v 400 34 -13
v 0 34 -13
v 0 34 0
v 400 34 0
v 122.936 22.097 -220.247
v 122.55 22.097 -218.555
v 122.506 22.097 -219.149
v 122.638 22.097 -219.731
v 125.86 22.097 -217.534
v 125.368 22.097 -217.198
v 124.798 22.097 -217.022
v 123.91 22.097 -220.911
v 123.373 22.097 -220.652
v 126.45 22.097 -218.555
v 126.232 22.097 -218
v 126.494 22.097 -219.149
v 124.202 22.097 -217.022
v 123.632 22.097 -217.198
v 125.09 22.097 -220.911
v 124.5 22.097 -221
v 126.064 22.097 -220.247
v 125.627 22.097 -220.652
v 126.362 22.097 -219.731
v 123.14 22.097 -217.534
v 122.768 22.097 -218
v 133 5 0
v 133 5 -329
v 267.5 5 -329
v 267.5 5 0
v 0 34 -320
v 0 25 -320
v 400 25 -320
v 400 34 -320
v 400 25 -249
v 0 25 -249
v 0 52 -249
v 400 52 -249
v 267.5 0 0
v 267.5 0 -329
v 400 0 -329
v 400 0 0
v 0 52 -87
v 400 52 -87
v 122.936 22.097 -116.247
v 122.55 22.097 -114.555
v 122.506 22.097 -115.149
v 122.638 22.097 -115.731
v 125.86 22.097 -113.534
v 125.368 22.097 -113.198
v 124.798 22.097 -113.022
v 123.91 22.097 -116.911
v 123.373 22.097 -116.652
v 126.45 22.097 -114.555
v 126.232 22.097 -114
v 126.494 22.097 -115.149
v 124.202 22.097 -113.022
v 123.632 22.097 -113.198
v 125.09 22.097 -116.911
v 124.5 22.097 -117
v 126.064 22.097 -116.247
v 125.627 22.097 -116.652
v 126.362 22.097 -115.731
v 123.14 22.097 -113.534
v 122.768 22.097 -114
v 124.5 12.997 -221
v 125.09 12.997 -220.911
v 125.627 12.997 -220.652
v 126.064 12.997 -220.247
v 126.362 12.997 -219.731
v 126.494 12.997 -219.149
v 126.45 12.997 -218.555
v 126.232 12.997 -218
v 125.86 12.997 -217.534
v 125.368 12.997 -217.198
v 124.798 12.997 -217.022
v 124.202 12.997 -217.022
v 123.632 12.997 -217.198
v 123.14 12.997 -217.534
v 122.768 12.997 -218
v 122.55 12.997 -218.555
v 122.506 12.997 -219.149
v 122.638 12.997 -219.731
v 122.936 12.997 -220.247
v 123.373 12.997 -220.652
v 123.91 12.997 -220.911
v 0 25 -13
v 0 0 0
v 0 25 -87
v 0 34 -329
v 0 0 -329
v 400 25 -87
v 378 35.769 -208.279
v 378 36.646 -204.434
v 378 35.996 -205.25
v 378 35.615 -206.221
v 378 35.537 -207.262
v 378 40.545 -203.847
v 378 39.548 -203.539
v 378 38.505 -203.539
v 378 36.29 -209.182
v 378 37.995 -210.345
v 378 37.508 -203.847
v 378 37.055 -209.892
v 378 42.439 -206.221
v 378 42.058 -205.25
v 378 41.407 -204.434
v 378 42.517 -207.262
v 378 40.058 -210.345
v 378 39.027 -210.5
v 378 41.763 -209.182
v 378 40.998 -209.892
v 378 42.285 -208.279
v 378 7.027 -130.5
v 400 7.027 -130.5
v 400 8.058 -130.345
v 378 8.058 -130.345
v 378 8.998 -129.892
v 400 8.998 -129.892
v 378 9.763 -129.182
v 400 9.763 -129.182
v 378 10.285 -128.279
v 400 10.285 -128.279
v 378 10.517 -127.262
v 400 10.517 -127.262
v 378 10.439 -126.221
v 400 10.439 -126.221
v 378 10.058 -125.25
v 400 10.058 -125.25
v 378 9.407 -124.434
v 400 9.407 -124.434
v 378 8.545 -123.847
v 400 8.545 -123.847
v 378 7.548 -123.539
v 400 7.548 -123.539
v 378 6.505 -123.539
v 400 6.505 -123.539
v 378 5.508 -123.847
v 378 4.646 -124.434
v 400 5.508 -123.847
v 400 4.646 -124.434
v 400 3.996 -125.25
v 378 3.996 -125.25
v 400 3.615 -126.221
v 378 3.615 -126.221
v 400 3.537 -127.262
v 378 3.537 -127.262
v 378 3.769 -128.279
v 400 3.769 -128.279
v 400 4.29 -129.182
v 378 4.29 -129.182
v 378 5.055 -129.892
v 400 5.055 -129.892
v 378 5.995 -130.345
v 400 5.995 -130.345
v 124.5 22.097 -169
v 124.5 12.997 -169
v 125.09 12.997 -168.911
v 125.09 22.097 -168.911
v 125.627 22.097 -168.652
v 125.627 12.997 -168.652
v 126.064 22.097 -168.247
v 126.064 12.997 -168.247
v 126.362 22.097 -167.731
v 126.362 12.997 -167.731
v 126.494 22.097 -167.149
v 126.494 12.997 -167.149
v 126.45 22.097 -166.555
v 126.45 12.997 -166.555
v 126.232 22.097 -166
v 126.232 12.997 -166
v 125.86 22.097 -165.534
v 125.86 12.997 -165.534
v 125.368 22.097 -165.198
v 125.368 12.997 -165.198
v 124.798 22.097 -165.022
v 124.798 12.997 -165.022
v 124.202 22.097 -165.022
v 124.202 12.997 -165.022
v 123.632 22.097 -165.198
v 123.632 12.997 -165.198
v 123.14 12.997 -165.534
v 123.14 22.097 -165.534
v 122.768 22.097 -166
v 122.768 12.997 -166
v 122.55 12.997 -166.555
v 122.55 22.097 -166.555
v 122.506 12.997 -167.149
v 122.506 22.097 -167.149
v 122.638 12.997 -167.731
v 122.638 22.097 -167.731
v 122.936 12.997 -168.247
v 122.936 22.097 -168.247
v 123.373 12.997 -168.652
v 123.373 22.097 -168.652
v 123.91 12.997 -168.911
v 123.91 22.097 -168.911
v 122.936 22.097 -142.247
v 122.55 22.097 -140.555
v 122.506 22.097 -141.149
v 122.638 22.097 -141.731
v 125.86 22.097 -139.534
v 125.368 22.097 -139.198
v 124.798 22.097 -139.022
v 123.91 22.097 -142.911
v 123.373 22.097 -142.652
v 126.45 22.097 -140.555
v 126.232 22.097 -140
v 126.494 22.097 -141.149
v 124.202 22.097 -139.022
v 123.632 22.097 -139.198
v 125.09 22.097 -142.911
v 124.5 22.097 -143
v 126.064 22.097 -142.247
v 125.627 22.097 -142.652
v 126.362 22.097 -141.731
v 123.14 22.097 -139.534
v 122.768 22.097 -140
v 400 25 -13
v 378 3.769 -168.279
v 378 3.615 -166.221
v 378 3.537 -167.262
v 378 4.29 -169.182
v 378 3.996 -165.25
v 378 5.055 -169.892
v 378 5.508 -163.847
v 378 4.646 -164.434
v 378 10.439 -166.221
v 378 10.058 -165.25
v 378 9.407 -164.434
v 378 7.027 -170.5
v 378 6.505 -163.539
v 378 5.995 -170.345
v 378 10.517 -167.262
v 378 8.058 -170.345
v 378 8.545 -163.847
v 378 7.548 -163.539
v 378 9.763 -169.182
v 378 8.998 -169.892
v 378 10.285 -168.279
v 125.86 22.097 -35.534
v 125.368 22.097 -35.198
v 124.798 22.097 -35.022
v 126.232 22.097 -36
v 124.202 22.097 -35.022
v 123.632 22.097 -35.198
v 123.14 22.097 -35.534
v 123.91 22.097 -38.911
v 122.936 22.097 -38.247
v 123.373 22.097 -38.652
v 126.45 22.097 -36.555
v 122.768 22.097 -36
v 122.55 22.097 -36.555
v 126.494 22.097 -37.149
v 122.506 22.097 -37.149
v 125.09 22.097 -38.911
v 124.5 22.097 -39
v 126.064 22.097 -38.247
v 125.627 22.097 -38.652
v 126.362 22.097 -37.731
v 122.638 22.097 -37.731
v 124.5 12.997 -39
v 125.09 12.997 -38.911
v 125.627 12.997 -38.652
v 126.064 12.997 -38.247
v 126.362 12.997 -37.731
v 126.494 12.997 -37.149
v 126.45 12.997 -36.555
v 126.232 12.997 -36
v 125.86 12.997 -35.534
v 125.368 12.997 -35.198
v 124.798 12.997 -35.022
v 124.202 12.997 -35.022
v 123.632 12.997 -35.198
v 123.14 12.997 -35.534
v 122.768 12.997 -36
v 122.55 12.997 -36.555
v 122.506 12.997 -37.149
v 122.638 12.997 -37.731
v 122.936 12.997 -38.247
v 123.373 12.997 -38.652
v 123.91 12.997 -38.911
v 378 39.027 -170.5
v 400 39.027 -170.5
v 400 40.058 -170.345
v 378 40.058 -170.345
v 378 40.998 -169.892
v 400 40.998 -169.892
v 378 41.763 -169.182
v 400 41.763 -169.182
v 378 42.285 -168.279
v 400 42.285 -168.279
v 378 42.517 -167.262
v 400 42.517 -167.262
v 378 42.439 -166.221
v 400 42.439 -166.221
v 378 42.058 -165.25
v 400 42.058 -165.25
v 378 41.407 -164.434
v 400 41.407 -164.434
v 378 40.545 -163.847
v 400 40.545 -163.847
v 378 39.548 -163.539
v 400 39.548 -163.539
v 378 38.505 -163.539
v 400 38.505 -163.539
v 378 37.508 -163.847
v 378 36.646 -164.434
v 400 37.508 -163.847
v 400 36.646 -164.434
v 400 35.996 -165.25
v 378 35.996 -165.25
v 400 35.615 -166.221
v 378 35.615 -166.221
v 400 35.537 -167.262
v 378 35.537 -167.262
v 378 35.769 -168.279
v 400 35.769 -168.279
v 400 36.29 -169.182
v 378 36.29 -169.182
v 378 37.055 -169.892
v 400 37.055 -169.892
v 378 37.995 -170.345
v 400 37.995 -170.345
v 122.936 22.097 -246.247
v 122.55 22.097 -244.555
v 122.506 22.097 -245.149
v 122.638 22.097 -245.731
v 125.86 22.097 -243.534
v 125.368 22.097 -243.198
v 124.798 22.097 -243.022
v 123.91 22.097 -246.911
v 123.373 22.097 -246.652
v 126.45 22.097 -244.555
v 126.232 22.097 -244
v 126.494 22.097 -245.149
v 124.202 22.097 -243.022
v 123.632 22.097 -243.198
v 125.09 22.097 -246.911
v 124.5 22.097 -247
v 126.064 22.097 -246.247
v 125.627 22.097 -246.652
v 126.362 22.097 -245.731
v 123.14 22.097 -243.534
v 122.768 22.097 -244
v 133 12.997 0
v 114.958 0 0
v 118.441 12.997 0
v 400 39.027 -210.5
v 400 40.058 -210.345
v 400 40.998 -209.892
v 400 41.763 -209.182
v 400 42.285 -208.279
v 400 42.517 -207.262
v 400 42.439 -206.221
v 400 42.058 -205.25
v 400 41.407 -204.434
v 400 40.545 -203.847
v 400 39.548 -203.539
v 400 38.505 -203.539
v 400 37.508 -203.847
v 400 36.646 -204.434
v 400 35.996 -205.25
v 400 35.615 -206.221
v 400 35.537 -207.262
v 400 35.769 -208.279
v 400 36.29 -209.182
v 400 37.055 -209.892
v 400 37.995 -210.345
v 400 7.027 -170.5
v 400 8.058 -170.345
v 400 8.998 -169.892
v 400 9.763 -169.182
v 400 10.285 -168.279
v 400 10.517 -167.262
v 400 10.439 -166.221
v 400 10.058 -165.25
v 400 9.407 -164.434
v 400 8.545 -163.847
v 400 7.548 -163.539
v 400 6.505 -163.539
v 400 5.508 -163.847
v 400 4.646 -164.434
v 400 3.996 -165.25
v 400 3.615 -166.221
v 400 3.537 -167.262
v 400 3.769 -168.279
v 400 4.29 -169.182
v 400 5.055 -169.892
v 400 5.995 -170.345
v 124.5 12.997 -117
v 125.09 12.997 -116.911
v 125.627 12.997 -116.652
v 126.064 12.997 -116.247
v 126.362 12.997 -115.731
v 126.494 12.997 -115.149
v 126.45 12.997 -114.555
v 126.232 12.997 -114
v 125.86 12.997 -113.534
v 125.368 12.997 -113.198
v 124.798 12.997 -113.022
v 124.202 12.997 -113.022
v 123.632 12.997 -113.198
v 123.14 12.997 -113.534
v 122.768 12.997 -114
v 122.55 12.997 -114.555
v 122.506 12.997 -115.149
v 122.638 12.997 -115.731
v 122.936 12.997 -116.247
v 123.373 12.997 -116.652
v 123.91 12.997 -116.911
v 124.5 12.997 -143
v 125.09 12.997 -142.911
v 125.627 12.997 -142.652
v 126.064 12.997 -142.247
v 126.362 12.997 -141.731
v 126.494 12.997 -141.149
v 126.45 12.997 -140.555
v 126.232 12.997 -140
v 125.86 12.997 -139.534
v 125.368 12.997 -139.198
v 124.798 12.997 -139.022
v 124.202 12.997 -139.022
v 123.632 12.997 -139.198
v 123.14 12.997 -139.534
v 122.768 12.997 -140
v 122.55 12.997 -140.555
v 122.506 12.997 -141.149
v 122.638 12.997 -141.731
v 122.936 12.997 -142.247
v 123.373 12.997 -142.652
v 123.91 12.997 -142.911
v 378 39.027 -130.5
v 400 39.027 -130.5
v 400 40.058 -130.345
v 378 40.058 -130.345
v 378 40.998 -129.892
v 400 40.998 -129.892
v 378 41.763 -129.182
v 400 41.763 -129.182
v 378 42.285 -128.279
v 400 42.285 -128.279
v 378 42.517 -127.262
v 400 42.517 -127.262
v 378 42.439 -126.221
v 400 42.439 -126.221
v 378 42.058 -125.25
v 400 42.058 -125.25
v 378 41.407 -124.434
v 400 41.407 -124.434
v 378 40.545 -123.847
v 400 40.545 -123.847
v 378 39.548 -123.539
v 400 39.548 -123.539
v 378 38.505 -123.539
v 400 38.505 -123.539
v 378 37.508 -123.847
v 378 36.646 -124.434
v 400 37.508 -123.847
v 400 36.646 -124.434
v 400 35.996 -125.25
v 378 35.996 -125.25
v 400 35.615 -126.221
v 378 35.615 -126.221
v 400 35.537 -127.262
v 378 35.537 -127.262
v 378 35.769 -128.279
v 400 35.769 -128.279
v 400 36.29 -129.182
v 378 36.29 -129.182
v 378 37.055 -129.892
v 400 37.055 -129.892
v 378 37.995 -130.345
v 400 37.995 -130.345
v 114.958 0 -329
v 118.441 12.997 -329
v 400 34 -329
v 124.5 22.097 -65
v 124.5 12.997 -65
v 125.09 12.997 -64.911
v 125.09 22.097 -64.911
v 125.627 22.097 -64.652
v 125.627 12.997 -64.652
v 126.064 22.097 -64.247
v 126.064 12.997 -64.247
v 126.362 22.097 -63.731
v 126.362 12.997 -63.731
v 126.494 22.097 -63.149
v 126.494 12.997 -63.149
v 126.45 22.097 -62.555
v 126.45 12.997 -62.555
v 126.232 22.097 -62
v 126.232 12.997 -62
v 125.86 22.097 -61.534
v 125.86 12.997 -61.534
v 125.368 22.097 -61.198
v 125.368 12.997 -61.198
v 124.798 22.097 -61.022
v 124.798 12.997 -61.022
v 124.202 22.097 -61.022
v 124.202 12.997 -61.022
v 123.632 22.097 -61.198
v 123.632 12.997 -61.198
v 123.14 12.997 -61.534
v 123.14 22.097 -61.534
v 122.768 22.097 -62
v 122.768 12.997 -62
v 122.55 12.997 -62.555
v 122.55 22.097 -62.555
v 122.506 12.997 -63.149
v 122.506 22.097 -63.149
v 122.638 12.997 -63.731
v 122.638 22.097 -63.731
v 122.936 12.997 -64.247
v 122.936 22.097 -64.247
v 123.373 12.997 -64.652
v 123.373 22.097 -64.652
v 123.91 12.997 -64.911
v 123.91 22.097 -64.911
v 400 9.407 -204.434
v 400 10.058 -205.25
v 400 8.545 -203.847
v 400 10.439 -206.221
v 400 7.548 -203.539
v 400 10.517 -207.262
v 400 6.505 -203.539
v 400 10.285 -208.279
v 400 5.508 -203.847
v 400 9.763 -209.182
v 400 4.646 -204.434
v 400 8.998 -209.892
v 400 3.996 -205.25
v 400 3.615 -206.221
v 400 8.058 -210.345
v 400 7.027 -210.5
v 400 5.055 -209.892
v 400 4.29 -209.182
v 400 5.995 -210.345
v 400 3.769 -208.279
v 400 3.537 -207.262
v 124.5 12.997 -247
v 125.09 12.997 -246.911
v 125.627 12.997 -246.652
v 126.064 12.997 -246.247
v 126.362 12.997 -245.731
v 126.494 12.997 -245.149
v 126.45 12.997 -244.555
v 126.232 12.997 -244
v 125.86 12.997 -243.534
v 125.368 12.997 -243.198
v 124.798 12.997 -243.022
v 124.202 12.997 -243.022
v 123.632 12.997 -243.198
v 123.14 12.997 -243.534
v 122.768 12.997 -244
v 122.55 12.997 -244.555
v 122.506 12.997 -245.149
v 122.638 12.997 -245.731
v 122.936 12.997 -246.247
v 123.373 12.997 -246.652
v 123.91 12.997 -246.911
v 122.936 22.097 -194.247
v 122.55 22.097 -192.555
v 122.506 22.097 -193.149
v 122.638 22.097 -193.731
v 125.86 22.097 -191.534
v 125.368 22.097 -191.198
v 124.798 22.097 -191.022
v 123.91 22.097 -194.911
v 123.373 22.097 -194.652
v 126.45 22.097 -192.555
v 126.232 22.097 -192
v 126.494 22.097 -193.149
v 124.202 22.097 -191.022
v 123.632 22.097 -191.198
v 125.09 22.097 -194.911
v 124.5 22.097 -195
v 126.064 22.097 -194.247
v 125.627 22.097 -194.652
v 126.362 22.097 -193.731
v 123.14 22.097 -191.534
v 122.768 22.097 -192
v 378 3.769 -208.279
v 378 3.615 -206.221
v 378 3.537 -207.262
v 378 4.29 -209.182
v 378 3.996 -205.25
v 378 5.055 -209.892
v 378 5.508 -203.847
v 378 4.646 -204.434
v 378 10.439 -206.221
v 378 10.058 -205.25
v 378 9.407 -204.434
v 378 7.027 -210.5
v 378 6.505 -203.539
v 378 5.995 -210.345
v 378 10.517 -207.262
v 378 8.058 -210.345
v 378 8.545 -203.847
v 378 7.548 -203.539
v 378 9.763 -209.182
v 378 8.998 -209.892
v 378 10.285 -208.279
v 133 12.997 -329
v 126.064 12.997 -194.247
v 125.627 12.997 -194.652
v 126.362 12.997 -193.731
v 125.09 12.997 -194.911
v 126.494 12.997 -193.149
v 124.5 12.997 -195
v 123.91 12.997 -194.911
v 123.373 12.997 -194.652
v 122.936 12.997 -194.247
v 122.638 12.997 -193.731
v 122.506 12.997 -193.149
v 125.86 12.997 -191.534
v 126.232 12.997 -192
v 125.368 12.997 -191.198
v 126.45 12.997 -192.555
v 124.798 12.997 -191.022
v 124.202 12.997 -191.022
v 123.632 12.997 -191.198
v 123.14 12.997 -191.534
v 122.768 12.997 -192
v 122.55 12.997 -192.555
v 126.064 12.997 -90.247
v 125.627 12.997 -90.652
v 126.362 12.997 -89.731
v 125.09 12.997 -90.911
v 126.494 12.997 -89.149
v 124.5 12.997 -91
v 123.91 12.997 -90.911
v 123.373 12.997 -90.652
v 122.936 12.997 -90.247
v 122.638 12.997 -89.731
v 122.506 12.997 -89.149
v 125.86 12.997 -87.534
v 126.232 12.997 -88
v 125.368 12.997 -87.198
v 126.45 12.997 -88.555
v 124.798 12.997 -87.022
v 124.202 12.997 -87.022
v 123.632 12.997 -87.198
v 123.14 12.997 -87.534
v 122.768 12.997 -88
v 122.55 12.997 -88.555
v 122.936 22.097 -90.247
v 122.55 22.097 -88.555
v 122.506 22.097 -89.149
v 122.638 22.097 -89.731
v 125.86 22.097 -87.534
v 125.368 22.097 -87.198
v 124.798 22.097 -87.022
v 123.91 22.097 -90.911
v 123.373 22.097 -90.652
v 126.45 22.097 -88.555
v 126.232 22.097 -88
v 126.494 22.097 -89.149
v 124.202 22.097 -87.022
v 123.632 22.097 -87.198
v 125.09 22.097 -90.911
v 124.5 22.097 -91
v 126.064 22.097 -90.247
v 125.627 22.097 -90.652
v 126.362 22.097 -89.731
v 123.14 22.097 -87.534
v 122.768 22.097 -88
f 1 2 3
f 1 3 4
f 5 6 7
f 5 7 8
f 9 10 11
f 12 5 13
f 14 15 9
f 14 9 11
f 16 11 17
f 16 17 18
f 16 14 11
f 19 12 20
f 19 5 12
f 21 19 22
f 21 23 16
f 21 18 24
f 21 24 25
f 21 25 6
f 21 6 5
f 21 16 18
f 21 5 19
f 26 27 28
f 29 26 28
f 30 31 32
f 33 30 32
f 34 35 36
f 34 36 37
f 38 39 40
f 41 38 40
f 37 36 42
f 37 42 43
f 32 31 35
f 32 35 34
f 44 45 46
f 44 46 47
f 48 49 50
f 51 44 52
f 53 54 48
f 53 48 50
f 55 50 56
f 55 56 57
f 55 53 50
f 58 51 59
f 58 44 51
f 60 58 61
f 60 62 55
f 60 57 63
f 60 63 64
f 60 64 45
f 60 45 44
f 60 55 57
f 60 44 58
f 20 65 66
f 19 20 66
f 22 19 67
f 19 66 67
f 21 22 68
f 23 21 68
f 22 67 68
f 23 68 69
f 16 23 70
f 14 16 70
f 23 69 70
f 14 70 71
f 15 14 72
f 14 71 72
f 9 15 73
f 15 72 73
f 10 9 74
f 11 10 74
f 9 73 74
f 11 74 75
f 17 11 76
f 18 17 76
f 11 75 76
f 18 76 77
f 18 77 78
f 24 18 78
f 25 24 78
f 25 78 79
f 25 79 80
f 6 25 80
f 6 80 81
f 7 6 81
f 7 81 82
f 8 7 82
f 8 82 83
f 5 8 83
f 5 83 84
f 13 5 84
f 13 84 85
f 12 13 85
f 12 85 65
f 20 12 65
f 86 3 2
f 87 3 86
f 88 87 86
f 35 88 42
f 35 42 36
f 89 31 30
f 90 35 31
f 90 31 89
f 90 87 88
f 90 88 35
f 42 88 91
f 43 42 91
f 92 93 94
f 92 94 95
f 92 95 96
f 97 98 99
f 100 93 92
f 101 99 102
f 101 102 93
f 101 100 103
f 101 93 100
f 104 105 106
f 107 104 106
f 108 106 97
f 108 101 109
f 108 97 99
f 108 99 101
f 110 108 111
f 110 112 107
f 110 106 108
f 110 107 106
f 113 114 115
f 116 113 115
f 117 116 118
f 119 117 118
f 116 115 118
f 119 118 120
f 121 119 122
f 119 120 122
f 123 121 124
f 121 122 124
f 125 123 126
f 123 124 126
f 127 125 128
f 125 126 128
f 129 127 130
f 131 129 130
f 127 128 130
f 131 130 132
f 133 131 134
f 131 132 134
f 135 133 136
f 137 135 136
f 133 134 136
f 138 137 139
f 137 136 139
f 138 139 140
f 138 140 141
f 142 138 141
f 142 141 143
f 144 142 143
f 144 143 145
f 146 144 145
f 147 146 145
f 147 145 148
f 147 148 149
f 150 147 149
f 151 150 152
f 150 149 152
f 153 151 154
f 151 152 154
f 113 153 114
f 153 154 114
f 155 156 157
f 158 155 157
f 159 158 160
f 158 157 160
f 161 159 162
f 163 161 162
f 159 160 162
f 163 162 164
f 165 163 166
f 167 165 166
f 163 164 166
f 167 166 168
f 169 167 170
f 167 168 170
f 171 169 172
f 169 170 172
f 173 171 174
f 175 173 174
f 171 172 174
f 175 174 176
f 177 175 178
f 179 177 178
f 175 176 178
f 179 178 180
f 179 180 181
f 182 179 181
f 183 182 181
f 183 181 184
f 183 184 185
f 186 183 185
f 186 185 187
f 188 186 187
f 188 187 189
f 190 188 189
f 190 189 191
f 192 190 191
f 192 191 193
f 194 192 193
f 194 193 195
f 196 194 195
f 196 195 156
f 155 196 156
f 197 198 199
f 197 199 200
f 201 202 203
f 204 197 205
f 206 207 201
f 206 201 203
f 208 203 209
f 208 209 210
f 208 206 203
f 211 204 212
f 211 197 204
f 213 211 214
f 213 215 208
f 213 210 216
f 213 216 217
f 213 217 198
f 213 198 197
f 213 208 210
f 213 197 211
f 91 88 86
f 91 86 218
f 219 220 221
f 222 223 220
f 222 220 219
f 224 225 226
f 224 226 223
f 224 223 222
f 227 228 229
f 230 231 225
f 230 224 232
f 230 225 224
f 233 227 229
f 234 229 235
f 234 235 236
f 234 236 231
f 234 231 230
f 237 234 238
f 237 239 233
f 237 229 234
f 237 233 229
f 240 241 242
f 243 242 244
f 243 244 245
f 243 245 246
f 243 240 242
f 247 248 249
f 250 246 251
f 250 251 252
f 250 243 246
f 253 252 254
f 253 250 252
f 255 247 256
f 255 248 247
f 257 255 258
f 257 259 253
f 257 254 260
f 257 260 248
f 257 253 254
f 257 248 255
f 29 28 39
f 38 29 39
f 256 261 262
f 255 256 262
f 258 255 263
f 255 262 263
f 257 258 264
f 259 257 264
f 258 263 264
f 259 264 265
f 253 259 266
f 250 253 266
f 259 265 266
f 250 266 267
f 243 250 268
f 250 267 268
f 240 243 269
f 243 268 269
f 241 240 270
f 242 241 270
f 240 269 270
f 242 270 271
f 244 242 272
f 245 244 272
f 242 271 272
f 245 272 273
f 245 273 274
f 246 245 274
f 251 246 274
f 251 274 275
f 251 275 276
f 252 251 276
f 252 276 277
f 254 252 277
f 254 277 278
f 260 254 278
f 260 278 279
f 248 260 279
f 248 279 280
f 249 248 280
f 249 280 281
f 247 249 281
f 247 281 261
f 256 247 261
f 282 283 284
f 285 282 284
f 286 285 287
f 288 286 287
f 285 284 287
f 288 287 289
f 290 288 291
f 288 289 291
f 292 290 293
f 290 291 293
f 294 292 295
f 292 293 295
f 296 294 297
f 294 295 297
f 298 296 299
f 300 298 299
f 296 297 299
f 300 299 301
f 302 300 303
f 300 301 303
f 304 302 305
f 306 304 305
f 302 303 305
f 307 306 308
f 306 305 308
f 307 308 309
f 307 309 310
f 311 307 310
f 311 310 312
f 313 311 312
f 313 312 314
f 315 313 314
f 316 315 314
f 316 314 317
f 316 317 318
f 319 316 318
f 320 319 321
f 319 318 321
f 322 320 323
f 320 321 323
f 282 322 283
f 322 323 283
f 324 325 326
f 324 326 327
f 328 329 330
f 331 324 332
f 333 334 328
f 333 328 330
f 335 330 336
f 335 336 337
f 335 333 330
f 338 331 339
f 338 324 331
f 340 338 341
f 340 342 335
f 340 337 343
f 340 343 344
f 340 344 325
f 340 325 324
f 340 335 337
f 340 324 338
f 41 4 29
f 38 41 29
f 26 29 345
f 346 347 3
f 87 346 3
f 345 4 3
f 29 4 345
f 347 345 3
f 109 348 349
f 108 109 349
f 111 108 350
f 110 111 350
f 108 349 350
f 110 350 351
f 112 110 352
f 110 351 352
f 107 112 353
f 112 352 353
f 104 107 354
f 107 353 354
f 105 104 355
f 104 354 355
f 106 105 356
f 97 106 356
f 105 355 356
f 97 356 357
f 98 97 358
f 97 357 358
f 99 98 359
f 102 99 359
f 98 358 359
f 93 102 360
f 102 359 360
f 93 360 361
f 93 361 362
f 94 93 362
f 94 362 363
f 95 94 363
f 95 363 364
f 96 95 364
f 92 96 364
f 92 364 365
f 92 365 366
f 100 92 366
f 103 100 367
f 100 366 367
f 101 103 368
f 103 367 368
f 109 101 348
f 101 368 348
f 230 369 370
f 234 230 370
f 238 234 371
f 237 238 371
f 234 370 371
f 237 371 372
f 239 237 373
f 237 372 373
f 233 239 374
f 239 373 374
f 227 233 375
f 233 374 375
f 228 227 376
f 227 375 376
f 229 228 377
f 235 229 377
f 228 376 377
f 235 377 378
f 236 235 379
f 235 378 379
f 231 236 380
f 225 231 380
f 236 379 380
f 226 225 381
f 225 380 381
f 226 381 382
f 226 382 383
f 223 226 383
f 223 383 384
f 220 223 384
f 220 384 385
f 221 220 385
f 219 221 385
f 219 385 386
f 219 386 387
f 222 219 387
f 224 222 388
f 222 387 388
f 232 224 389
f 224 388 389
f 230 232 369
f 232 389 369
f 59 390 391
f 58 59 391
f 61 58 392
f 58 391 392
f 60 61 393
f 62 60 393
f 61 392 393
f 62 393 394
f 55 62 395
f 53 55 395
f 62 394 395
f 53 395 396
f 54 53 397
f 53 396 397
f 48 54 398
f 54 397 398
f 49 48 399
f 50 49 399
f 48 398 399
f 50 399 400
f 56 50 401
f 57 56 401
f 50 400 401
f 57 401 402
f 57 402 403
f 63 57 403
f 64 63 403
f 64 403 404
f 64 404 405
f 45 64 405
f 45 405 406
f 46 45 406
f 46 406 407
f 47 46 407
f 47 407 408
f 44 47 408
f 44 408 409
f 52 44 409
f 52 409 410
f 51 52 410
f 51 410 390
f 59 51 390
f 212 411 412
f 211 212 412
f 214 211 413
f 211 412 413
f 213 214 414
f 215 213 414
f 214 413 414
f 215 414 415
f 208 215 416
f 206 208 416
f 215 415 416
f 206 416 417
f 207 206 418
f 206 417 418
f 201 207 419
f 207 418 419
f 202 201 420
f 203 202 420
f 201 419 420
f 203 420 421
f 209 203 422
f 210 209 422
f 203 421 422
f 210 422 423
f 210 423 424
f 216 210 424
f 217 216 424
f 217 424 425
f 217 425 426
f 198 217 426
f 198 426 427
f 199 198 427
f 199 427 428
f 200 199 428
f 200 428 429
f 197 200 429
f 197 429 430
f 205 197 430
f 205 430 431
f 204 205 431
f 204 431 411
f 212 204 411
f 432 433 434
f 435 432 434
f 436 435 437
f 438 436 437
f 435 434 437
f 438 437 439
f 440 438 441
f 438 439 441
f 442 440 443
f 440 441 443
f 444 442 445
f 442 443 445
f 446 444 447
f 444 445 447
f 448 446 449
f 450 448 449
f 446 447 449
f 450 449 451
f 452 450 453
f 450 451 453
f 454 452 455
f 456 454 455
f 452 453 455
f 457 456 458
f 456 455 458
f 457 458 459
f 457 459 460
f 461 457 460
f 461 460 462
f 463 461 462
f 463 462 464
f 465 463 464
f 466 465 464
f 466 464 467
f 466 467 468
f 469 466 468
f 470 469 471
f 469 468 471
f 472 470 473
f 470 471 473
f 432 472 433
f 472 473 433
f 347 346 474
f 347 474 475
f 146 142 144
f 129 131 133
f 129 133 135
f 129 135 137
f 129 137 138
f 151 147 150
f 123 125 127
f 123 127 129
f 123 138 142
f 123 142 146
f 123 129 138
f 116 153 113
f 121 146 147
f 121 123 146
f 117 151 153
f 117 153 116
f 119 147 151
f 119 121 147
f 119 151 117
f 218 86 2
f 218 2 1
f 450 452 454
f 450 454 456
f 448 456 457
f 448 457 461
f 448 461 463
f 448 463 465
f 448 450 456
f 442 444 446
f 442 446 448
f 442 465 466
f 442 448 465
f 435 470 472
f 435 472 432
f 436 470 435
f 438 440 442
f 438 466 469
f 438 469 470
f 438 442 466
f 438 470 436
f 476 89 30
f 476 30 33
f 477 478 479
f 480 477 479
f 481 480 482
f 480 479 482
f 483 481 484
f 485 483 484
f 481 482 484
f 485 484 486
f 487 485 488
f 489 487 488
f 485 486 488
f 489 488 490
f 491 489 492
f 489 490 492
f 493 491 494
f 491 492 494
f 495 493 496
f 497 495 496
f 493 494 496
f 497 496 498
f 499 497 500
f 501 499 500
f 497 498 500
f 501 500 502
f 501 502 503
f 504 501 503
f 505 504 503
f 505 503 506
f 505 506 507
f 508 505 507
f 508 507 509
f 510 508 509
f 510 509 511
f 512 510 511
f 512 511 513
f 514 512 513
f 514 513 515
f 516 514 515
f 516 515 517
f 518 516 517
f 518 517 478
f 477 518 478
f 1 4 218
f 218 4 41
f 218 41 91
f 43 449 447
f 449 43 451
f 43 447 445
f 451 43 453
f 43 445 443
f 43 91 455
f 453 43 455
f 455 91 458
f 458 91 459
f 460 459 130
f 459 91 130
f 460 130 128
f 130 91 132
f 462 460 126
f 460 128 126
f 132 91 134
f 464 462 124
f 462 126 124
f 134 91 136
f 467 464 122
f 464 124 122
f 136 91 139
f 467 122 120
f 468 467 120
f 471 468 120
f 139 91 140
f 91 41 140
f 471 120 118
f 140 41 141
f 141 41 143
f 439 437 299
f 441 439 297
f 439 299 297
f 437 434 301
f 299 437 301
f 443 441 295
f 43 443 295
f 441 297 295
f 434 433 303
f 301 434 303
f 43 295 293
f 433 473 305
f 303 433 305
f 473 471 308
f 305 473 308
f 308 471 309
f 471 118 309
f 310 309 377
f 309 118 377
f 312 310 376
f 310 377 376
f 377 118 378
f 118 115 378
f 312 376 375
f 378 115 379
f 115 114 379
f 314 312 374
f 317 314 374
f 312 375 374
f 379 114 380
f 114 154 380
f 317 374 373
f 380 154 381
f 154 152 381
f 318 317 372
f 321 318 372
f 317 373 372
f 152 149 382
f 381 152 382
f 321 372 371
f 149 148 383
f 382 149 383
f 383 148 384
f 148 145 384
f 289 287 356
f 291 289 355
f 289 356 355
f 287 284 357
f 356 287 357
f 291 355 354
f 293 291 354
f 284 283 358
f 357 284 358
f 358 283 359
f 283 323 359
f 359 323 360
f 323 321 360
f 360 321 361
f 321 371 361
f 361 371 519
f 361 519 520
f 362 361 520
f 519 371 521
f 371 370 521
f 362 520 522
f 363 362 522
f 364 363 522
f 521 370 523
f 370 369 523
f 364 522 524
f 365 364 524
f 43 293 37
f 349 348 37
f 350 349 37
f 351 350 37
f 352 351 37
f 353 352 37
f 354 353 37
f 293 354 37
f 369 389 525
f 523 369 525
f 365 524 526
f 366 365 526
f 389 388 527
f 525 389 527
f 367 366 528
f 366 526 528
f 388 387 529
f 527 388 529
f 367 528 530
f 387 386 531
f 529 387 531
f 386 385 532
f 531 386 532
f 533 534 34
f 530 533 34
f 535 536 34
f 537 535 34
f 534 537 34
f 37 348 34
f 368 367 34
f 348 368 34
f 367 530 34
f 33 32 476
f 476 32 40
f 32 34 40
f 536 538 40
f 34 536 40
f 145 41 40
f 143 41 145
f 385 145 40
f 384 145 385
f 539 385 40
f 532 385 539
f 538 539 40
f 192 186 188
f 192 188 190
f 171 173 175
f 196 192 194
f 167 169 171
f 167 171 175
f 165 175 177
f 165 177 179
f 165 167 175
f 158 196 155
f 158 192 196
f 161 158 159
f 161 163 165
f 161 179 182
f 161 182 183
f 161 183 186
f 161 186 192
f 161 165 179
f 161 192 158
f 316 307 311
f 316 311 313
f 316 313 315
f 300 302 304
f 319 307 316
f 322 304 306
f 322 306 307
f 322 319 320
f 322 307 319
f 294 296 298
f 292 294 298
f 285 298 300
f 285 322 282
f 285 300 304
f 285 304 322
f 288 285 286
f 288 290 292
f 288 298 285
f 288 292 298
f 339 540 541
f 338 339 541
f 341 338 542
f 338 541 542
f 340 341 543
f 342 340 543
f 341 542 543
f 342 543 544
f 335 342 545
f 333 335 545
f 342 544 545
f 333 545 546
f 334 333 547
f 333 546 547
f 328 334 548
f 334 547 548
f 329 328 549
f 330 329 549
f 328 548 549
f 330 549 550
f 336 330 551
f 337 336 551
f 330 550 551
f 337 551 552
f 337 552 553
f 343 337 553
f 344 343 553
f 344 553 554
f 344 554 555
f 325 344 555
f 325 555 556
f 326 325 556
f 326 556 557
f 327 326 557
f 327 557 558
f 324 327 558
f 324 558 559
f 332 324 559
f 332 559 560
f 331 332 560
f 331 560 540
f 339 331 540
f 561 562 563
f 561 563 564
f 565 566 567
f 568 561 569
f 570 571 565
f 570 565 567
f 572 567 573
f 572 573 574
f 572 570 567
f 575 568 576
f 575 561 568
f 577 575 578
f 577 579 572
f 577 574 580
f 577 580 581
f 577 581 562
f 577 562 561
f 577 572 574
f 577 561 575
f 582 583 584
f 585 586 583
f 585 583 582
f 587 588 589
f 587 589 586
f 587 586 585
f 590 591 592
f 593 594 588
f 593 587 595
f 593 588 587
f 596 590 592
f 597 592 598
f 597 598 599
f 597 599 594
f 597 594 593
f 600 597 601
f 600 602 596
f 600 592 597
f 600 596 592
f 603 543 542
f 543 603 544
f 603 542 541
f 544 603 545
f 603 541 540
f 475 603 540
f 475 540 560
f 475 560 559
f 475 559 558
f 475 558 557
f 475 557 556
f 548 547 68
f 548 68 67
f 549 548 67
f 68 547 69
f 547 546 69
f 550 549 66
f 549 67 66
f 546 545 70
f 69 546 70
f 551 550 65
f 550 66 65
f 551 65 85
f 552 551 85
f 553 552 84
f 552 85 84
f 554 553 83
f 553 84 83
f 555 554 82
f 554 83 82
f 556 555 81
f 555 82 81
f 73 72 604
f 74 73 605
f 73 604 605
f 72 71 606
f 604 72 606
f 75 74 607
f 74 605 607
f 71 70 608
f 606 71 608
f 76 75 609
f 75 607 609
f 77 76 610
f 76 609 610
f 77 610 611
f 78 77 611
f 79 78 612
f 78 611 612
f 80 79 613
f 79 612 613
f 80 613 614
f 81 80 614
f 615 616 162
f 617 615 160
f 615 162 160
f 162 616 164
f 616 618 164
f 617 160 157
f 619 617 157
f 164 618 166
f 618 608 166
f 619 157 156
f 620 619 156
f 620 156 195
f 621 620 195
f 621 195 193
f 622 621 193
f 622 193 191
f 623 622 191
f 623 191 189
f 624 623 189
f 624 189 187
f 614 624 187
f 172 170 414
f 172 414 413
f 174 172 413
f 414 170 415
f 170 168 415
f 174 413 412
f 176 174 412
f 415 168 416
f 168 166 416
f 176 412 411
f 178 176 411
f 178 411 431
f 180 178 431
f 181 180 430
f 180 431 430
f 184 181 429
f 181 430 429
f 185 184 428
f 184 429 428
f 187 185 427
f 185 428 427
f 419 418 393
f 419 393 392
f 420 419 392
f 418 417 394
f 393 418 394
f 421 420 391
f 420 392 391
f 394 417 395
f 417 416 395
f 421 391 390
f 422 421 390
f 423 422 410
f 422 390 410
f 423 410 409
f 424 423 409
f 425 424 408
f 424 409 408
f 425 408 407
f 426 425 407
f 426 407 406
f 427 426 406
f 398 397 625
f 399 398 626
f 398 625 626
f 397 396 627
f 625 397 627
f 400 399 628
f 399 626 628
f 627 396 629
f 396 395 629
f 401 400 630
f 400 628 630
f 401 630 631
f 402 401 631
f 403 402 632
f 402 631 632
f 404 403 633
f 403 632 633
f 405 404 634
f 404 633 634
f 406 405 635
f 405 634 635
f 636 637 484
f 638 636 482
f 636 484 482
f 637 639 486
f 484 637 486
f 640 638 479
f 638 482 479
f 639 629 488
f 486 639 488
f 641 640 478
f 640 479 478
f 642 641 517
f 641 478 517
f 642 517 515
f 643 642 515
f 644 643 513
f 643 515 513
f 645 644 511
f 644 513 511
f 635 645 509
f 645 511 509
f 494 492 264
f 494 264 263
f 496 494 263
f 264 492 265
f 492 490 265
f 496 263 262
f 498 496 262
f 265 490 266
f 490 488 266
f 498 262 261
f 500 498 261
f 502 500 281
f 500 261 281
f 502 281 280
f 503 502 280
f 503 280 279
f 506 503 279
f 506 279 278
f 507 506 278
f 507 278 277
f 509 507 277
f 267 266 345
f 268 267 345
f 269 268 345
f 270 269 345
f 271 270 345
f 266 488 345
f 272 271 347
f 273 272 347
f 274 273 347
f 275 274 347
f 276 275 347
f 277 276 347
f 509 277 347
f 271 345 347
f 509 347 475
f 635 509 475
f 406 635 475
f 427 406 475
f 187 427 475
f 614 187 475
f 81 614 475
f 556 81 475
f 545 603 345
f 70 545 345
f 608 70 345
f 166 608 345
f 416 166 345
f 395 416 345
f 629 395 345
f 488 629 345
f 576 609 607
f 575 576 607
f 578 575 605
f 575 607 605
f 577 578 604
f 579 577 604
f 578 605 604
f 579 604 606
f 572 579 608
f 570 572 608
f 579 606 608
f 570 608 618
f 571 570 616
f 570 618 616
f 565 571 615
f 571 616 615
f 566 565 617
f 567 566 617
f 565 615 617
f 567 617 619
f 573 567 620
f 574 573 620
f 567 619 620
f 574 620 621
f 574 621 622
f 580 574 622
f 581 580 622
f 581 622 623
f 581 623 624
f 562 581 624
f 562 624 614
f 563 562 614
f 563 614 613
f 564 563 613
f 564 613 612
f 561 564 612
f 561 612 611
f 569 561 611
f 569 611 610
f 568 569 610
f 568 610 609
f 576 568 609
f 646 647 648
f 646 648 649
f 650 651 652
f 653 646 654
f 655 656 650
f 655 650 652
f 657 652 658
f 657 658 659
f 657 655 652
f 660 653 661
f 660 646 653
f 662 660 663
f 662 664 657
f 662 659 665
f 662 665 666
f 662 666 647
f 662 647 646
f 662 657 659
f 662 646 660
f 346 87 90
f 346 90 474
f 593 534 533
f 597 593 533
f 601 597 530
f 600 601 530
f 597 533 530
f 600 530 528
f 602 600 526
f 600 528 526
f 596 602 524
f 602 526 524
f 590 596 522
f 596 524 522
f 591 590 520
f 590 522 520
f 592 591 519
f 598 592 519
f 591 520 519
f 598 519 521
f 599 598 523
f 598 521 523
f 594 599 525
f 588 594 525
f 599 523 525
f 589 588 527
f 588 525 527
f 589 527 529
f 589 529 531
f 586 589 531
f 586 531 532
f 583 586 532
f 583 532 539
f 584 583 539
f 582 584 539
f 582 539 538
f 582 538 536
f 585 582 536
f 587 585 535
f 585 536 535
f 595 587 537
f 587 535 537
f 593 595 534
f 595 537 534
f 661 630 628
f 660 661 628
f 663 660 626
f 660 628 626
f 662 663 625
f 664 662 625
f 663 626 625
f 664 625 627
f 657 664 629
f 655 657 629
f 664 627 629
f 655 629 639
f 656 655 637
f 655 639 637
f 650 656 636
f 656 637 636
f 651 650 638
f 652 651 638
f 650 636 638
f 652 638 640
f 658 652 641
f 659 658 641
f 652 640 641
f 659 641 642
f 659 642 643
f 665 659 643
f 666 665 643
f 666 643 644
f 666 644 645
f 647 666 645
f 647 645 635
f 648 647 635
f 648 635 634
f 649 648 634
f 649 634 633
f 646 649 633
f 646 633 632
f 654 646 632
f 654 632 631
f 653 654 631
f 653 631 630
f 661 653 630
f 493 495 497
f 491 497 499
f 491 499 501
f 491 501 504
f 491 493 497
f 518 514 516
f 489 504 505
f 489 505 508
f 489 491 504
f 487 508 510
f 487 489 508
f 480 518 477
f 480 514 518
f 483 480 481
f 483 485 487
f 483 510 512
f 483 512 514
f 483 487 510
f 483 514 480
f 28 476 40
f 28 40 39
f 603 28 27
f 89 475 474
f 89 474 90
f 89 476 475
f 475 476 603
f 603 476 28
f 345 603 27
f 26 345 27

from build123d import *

# Parameters (mm, degrees)
SKETCH_1_W           = 400
SKETCH_1_H           = 329
EXTRUDE_1_DEPTH      = 25
SKETCH_2_W           = 400
SKETCH_2_H           = 162
EXTRUDE_2_DEPTH      = 27
SKETCH_4_W           = 400
SKETCH_4_H           = 9
SKETCH_4_H_2         = 13
EXTRUDE_3_DEPTH      = 9
CUT_EXTRUDE_3_DEPTH  = 400
SKETCH_10_R          = 2
CUT_EXTRUDE_8_DEPTH  = 9.03
EXTRUDE_START        = 0.07
SKETCH_12_W          = 14.540639504
SKETCH_12_H          = 329
SKETCH_12_R          = 2
EXTRUDE_4_DEPTH      = 0.07
EXTRUDE_5_DEPTH      = 329
SKETCH_15_R          = 3.5
CUT_EXTRUDE_10_DEPTH = 22


with BuildPart() as part:
    # 草图1 → 凸台-拉伸1 (new body)
    with BuildSketch(Plane(origin=(0, 0, 0), x_dir=(1, 0, 0), z_dir=(0, 1, 0))):
        with Locations((200, 164.5)):
            Rectangle(SKETCH_1_W, SKETCH_1_H)
    extrude(amount=EXTRUDE_1_DEPTH)

    # 草图2 → 凸台-拉伸2 (add)
    with BuildSketch(Plane(origin=(0, 25, 0), x_dir=(1, 0, 0), z_dir=(0, 1, 0))):
        with Locations((200, 168)):
            Rectangle(SKETCH_2_W, SKETCH_2_H)
    extrude(amount=EXTRUDE_2_DEPTH)

    # 草图4 → 凸台-拉伸3 (add)
    with BuildSketch(Plane(origin=(0, 25, 0), x_dir=(1, 0, 0), z_dir=(0, 1, 0))):
        with Locations((200, 324.5)):
            Rectangle(SKETCH_4_W, SKETCH_4_H)
        with Locations((200, 6.5)):
            Rectangle(SKETCH_4_W, SKETCH_4_H_2)
    extrude(amount=EXTRUDE_3_DEPTH)

    # 草图8 → 切除-拉伸3 (cut)
    with BuildSketch(Plane(origin=(0, 0, -329), x_dir=(-1, 0, 0), z_dir=(0, 0, -1))):
        Polygon((-267.5, 5), (-267.5, 0), (-114.958104289, 0), (-118.459360496, 13.066866054), (-133, 13.066866054), (-133, 5), align=None)
    extrude(amount=-CUT_EXTRUDE_3_DEPTH, mode=Mode.SUBTRACT)

    # 草图10 → 切除-拉伸8 (cut)
    with BuildSketch(Plane.XZ.offset(-13.066866054)):
        with Locations(Location((124.5, -37, 0), (0, 0, 270))):
            Circle(SKETCH_10_R)
        with Locations(Location((124.5, -63, 0), (0, 0, 270))):
            Circle(SKETCH_10_R)
        with Locations(Location((124.5, -89, 0), (0, 0, 270))):
            Circle(SKETCH_10_R)
        with Locations(Location((124.5, -115, 0), (0, 0, 270))):
            Circle(SKETCH_10_R)
        with Locations(Location((124.5, -141, 0), (0, 0, 270))):
            Circle(SKETCH_10_R)
        with Locations(Location((124.5, -167, 0), (0, 0, 270))):
            Circle(SKETCH_10_R)
        with Locations(Location((124.5, -193, 0), (0, 0, 270))):
            Circle(SKETCH_10_R)
        with Locations(Location((124.5, -219, 0), (0, 0, 270))):
            Circle(SKETCH_10_R)
        with Locations(Location((124.5, -245, 0), (0, 0, 270))):
            Circle(SKETCH_10_R)
    extrude(amount=-CUT_EXTRUDE_8_DEPTH, mode=Mode.SUBTRACT)

    # 草图12 → 凸台-拉伸4 (add)
    with BuildSketch(Plane.XZ.offset(-13.066866054).offset(EXTRUDE_START)):
        with Locations((125.729680248, -164.5)):
            Rectangle(SKETCH_12_W, SKETCH_12_H)
        with Locations(Location((124.5, -63, 0), (0, 0, 270))):
            Circle(SKETCH_12_R, mode=Mode.SUBTRACT)
        with Locations(Location((124.5, -115, 0), (0, 0, 270))):
            Circle(SKETCH_12_R, mode=Mode.SUBTRACT)
        with Locations(Location((124.5, -167, 0), (0, 0, 270))):
            Circle(SKETCH_12_R, mode=Mode.SUBTRACT)
        with Locations(Location((124.5, -219, 0), (0, 0, 270))):
            Circle(SKETCH_12_R, mode=Mode.SUBTRACT)
        with Locations(Location((124.5, -245, 0), (0, 0, 270))):
            Circle(SKETCH_12_R, mode=Mode.SUBTRACT)
        with Locations(Location((124.5, -193, 0), (0, 0, 270))):
            Circle(SKETCH_12_R, mode=Mode.SUBTRACT)
        with Locations(Location((124.5, -141, 0), (0, 0, 270))):
            Circle(SKETCH_12_R, mode=Mode.SUBTRACT)
        with Locations(Location((124.5, -89, 0), (0, 0, 270))):
            Circle(SKETCH_12_R, mode=Mode.SUBTRACT)
        with Locations(Location((124.5, -37, 0), (0, 0, 270))):
            Circle(SKETCH_12_R, mode=Mode.SUBTRACT)
    extrude(amount=-EXTRUDE_4_DEPTH)

    # 草图13 → 凸台-拉伸5 (add)
    with BuildSketch(Plane.XY):
        Polygon((118.459360496, 13.066866054), (118.459360496, 12.996866054), (118.440604053, 12.996866054), align=None)
    extrude(amount=-EXTRUDE_5_DEPTH)

    # 草图15 → 切除-拉伸10 (cut)
    with BuildSketch(Plane(origin=(400, 0, 0), x_dir=(0, 0, -1), z_dir=(1, 0, 0))):
        with Locations((207, 39.026793109)):
            Circle(SKETCH_15_R)
        with Locations((207, 7.026793109)):
            Circle(SKETCH_15_R)
        with Locations((167, 39.026793109)):
            Circle(SKETCH_15_R)
        with Locations((167, 7.026793109)):
            Circle(SKETCH_15_R)
        with Locations((127, 39.026793109)):
            Circle(SKETCH_15_R)
        with Locations((127, 7.026793109)):
            Circle(SKETCH_15_R)
    extrude(amount=-CUT_EXTRUDE_10_DEPTH, mode=Mode.SUBTRACT)


solid = part.part
